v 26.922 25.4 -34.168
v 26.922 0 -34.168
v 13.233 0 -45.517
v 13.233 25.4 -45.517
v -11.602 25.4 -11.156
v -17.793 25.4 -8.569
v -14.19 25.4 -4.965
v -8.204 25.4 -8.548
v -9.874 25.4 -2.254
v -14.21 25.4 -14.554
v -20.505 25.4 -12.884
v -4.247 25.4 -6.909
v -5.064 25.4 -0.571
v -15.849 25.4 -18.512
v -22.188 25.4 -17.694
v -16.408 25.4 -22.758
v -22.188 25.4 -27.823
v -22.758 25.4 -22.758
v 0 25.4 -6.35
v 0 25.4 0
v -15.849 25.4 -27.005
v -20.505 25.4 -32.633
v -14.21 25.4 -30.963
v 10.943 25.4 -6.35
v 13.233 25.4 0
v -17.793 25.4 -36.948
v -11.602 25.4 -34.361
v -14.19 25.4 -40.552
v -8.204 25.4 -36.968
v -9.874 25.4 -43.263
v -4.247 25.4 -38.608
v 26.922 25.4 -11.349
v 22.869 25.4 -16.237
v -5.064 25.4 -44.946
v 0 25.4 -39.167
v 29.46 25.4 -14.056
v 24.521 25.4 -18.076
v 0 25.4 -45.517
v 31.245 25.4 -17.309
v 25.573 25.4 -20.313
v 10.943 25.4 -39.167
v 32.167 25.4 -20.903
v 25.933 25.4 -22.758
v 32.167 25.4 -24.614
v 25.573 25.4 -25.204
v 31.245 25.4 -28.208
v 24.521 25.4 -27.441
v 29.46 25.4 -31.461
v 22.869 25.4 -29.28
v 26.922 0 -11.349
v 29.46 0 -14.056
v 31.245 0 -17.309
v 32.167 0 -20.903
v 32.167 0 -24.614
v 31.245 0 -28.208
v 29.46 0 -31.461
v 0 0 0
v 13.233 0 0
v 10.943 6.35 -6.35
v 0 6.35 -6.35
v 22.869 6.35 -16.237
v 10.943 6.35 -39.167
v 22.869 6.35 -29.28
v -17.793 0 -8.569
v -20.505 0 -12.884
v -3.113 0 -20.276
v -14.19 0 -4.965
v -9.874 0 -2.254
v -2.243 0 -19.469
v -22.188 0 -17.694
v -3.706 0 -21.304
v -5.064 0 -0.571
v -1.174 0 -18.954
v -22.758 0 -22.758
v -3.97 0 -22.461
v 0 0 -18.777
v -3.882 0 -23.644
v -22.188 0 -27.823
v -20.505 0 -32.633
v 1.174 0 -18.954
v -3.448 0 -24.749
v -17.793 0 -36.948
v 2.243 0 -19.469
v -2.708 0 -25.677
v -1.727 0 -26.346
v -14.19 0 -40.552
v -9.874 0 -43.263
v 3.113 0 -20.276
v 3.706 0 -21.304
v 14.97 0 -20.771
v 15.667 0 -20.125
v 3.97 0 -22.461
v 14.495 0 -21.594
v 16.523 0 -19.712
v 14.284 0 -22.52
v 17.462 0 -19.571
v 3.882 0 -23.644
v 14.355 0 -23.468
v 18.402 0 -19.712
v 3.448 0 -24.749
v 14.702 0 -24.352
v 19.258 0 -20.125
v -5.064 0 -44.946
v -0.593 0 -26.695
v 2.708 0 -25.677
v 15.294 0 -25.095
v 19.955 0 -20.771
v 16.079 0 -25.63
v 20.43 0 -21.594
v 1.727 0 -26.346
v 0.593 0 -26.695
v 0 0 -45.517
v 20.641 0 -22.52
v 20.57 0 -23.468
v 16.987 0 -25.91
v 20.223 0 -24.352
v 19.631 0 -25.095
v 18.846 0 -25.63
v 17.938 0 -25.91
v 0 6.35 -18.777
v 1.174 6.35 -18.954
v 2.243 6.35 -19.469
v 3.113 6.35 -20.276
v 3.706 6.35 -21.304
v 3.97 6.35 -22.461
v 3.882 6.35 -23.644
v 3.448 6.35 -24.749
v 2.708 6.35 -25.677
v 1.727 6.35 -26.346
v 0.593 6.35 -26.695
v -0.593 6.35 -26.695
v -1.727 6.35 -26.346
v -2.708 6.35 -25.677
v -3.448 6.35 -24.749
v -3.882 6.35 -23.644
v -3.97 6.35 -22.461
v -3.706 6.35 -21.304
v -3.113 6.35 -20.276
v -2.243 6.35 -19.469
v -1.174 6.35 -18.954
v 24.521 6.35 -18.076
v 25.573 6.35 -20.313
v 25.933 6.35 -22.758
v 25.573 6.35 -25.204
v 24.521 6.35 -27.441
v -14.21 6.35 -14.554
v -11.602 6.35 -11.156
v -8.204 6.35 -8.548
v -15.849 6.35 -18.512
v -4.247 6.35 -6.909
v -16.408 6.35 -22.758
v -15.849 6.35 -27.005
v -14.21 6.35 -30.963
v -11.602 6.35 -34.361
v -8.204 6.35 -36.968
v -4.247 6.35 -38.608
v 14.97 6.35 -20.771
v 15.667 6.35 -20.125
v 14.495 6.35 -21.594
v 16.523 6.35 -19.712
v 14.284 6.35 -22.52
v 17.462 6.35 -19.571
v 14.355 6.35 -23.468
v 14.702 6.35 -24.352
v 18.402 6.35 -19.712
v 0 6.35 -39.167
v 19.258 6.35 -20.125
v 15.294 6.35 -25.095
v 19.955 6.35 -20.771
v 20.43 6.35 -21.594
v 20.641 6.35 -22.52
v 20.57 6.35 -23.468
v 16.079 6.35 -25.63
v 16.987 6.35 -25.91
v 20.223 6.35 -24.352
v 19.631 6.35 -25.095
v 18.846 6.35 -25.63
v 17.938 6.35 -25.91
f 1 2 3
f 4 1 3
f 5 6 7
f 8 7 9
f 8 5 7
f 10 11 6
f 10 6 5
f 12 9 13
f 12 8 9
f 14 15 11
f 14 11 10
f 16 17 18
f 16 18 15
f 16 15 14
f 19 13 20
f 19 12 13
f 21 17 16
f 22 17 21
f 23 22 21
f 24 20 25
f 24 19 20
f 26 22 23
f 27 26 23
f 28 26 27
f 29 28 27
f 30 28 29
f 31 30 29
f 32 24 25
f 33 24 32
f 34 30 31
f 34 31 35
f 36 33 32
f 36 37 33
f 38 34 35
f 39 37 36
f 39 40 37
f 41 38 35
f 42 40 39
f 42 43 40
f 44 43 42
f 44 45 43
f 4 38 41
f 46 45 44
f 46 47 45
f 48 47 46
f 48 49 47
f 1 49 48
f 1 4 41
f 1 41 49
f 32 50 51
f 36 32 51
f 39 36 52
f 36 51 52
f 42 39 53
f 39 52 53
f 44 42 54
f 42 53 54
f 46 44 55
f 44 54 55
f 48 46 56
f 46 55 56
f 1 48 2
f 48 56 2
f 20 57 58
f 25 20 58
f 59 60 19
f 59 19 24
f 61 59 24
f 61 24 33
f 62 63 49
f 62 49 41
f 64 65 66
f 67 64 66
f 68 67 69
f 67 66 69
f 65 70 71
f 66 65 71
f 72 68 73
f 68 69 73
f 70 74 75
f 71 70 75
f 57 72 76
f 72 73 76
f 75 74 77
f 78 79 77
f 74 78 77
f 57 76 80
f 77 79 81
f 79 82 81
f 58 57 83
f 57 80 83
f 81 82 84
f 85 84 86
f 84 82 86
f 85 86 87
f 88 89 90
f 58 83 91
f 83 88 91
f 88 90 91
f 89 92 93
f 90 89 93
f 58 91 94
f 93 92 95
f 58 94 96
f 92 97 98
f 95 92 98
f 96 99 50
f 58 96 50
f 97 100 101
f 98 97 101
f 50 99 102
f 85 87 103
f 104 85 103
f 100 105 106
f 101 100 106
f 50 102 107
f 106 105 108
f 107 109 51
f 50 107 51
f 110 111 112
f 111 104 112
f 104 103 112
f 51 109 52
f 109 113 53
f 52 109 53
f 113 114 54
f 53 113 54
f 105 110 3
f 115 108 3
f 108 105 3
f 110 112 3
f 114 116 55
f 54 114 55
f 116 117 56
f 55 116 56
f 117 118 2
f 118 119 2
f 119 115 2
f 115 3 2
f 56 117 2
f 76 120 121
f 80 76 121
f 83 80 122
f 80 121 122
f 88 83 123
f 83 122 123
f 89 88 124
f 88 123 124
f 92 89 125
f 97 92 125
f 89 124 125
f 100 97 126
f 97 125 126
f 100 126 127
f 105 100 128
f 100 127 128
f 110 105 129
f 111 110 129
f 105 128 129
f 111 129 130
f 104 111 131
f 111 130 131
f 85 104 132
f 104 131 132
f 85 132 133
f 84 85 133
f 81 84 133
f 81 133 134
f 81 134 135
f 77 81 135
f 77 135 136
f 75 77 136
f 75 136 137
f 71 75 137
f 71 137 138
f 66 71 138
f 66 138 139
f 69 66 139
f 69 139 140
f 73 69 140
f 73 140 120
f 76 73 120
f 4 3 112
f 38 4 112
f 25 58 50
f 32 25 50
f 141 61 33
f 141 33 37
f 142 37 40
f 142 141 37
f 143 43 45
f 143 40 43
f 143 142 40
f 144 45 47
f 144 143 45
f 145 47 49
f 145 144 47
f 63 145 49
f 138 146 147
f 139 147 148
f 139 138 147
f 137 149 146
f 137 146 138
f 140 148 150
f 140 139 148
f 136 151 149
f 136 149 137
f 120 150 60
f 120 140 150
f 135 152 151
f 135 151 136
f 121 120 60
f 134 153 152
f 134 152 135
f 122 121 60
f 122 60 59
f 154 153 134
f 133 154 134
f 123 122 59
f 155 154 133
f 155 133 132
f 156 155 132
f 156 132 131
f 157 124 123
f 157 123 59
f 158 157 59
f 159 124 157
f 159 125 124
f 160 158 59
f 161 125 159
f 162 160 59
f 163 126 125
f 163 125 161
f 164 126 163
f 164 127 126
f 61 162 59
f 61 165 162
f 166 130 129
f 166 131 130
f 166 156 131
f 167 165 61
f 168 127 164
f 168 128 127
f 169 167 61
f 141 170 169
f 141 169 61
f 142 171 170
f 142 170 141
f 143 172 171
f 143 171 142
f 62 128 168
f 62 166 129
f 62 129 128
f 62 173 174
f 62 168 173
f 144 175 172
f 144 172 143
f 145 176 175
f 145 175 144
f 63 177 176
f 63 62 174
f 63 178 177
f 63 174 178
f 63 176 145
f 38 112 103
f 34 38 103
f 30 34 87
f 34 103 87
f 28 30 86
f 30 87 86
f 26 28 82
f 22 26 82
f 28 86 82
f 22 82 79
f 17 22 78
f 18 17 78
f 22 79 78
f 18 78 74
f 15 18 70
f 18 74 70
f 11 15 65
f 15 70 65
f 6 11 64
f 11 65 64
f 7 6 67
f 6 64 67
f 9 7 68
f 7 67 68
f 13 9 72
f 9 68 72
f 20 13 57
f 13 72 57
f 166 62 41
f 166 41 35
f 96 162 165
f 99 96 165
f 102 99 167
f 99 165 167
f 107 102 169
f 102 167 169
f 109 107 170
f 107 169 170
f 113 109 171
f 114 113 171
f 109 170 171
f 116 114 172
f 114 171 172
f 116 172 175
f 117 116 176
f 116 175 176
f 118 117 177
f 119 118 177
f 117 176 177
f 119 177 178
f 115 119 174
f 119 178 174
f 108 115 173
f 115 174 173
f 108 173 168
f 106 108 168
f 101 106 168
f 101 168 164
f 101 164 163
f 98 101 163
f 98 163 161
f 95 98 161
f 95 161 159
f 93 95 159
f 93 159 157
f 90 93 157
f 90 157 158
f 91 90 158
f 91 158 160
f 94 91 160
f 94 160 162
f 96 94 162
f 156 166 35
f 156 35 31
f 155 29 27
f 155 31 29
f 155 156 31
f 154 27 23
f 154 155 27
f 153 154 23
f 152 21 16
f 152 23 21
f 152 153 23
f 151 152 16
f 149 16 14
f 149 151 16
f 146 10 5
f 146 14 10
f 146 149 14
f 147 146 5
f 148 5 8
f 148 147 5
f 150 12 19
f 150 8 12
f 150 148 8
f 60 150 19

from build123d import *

# Parameters (mm, degrees)
BOSS_EXTRUDE1_DEPTH = 25.4
SHELL1_T            = -6.35
SKETCH2_R           = 3.98145
SKETCH2_R_2         = 3.1877
CUT_EXTRUDE1_DEPTH  = 59.965239742


with BuildPart() as part:
    # Sketch1 → Boss-Extrude1 (new body)
    with BuildSketch(Plane(origin=(0, 0, 0), x_dir=(1, 0, 0), z_dir=(0, 1, 0))):
        with BuildLine():
            Line((13.2334, 0), (26.921911775, 11.34881606))
            ThreePointArc((26.921911775, 11.34881606), (32.2834, 22.7584), (26.921911775, 34.16798394))
            Line((26.921911775, 34.16798394), (13.2334, 45.5168))
            Line((13.2334, 45.5168), (0, 45.5168))
            ThreePointArc((0, 45.5168), (-22.7584, 22.7584), (0, 0))
            Line((0, 0), (13.2334, 0))
        make_face()
    extrude(amount=BOSS_EXTRUDE1_DEPTH)

    # Shell1
    shell1_openings = [part.faces().sort_by_distance(p)[0] for p in [
        (3.880100933, 25.4, -22.7584),
    ]]
    offset(amount=SHELL1_T, openings=shell1_openings, kind=Kind.INTERSECTION)

    # Sketch2 → Cut-Extrude1 (cut, through all)
    with BuildSketch(Plane(origin=(0, 6.35, 0), x_dir=(1, 0, 0), z_dir=(0, 1, 0))):
        with Locations(Location((0, 22.7584, 0), (0, 0, 270))):
            Circle(SKETCH2_R)
        with Locations(Location((17.4625, 22.7584, 0), (0, 0, 270))):
            Circle(SKETCH2_R_2)
    extrude(amount=-CUT_EXTRUDE1_DEPTH, mode=Mode.SUBTRACT)


solid = part.part
